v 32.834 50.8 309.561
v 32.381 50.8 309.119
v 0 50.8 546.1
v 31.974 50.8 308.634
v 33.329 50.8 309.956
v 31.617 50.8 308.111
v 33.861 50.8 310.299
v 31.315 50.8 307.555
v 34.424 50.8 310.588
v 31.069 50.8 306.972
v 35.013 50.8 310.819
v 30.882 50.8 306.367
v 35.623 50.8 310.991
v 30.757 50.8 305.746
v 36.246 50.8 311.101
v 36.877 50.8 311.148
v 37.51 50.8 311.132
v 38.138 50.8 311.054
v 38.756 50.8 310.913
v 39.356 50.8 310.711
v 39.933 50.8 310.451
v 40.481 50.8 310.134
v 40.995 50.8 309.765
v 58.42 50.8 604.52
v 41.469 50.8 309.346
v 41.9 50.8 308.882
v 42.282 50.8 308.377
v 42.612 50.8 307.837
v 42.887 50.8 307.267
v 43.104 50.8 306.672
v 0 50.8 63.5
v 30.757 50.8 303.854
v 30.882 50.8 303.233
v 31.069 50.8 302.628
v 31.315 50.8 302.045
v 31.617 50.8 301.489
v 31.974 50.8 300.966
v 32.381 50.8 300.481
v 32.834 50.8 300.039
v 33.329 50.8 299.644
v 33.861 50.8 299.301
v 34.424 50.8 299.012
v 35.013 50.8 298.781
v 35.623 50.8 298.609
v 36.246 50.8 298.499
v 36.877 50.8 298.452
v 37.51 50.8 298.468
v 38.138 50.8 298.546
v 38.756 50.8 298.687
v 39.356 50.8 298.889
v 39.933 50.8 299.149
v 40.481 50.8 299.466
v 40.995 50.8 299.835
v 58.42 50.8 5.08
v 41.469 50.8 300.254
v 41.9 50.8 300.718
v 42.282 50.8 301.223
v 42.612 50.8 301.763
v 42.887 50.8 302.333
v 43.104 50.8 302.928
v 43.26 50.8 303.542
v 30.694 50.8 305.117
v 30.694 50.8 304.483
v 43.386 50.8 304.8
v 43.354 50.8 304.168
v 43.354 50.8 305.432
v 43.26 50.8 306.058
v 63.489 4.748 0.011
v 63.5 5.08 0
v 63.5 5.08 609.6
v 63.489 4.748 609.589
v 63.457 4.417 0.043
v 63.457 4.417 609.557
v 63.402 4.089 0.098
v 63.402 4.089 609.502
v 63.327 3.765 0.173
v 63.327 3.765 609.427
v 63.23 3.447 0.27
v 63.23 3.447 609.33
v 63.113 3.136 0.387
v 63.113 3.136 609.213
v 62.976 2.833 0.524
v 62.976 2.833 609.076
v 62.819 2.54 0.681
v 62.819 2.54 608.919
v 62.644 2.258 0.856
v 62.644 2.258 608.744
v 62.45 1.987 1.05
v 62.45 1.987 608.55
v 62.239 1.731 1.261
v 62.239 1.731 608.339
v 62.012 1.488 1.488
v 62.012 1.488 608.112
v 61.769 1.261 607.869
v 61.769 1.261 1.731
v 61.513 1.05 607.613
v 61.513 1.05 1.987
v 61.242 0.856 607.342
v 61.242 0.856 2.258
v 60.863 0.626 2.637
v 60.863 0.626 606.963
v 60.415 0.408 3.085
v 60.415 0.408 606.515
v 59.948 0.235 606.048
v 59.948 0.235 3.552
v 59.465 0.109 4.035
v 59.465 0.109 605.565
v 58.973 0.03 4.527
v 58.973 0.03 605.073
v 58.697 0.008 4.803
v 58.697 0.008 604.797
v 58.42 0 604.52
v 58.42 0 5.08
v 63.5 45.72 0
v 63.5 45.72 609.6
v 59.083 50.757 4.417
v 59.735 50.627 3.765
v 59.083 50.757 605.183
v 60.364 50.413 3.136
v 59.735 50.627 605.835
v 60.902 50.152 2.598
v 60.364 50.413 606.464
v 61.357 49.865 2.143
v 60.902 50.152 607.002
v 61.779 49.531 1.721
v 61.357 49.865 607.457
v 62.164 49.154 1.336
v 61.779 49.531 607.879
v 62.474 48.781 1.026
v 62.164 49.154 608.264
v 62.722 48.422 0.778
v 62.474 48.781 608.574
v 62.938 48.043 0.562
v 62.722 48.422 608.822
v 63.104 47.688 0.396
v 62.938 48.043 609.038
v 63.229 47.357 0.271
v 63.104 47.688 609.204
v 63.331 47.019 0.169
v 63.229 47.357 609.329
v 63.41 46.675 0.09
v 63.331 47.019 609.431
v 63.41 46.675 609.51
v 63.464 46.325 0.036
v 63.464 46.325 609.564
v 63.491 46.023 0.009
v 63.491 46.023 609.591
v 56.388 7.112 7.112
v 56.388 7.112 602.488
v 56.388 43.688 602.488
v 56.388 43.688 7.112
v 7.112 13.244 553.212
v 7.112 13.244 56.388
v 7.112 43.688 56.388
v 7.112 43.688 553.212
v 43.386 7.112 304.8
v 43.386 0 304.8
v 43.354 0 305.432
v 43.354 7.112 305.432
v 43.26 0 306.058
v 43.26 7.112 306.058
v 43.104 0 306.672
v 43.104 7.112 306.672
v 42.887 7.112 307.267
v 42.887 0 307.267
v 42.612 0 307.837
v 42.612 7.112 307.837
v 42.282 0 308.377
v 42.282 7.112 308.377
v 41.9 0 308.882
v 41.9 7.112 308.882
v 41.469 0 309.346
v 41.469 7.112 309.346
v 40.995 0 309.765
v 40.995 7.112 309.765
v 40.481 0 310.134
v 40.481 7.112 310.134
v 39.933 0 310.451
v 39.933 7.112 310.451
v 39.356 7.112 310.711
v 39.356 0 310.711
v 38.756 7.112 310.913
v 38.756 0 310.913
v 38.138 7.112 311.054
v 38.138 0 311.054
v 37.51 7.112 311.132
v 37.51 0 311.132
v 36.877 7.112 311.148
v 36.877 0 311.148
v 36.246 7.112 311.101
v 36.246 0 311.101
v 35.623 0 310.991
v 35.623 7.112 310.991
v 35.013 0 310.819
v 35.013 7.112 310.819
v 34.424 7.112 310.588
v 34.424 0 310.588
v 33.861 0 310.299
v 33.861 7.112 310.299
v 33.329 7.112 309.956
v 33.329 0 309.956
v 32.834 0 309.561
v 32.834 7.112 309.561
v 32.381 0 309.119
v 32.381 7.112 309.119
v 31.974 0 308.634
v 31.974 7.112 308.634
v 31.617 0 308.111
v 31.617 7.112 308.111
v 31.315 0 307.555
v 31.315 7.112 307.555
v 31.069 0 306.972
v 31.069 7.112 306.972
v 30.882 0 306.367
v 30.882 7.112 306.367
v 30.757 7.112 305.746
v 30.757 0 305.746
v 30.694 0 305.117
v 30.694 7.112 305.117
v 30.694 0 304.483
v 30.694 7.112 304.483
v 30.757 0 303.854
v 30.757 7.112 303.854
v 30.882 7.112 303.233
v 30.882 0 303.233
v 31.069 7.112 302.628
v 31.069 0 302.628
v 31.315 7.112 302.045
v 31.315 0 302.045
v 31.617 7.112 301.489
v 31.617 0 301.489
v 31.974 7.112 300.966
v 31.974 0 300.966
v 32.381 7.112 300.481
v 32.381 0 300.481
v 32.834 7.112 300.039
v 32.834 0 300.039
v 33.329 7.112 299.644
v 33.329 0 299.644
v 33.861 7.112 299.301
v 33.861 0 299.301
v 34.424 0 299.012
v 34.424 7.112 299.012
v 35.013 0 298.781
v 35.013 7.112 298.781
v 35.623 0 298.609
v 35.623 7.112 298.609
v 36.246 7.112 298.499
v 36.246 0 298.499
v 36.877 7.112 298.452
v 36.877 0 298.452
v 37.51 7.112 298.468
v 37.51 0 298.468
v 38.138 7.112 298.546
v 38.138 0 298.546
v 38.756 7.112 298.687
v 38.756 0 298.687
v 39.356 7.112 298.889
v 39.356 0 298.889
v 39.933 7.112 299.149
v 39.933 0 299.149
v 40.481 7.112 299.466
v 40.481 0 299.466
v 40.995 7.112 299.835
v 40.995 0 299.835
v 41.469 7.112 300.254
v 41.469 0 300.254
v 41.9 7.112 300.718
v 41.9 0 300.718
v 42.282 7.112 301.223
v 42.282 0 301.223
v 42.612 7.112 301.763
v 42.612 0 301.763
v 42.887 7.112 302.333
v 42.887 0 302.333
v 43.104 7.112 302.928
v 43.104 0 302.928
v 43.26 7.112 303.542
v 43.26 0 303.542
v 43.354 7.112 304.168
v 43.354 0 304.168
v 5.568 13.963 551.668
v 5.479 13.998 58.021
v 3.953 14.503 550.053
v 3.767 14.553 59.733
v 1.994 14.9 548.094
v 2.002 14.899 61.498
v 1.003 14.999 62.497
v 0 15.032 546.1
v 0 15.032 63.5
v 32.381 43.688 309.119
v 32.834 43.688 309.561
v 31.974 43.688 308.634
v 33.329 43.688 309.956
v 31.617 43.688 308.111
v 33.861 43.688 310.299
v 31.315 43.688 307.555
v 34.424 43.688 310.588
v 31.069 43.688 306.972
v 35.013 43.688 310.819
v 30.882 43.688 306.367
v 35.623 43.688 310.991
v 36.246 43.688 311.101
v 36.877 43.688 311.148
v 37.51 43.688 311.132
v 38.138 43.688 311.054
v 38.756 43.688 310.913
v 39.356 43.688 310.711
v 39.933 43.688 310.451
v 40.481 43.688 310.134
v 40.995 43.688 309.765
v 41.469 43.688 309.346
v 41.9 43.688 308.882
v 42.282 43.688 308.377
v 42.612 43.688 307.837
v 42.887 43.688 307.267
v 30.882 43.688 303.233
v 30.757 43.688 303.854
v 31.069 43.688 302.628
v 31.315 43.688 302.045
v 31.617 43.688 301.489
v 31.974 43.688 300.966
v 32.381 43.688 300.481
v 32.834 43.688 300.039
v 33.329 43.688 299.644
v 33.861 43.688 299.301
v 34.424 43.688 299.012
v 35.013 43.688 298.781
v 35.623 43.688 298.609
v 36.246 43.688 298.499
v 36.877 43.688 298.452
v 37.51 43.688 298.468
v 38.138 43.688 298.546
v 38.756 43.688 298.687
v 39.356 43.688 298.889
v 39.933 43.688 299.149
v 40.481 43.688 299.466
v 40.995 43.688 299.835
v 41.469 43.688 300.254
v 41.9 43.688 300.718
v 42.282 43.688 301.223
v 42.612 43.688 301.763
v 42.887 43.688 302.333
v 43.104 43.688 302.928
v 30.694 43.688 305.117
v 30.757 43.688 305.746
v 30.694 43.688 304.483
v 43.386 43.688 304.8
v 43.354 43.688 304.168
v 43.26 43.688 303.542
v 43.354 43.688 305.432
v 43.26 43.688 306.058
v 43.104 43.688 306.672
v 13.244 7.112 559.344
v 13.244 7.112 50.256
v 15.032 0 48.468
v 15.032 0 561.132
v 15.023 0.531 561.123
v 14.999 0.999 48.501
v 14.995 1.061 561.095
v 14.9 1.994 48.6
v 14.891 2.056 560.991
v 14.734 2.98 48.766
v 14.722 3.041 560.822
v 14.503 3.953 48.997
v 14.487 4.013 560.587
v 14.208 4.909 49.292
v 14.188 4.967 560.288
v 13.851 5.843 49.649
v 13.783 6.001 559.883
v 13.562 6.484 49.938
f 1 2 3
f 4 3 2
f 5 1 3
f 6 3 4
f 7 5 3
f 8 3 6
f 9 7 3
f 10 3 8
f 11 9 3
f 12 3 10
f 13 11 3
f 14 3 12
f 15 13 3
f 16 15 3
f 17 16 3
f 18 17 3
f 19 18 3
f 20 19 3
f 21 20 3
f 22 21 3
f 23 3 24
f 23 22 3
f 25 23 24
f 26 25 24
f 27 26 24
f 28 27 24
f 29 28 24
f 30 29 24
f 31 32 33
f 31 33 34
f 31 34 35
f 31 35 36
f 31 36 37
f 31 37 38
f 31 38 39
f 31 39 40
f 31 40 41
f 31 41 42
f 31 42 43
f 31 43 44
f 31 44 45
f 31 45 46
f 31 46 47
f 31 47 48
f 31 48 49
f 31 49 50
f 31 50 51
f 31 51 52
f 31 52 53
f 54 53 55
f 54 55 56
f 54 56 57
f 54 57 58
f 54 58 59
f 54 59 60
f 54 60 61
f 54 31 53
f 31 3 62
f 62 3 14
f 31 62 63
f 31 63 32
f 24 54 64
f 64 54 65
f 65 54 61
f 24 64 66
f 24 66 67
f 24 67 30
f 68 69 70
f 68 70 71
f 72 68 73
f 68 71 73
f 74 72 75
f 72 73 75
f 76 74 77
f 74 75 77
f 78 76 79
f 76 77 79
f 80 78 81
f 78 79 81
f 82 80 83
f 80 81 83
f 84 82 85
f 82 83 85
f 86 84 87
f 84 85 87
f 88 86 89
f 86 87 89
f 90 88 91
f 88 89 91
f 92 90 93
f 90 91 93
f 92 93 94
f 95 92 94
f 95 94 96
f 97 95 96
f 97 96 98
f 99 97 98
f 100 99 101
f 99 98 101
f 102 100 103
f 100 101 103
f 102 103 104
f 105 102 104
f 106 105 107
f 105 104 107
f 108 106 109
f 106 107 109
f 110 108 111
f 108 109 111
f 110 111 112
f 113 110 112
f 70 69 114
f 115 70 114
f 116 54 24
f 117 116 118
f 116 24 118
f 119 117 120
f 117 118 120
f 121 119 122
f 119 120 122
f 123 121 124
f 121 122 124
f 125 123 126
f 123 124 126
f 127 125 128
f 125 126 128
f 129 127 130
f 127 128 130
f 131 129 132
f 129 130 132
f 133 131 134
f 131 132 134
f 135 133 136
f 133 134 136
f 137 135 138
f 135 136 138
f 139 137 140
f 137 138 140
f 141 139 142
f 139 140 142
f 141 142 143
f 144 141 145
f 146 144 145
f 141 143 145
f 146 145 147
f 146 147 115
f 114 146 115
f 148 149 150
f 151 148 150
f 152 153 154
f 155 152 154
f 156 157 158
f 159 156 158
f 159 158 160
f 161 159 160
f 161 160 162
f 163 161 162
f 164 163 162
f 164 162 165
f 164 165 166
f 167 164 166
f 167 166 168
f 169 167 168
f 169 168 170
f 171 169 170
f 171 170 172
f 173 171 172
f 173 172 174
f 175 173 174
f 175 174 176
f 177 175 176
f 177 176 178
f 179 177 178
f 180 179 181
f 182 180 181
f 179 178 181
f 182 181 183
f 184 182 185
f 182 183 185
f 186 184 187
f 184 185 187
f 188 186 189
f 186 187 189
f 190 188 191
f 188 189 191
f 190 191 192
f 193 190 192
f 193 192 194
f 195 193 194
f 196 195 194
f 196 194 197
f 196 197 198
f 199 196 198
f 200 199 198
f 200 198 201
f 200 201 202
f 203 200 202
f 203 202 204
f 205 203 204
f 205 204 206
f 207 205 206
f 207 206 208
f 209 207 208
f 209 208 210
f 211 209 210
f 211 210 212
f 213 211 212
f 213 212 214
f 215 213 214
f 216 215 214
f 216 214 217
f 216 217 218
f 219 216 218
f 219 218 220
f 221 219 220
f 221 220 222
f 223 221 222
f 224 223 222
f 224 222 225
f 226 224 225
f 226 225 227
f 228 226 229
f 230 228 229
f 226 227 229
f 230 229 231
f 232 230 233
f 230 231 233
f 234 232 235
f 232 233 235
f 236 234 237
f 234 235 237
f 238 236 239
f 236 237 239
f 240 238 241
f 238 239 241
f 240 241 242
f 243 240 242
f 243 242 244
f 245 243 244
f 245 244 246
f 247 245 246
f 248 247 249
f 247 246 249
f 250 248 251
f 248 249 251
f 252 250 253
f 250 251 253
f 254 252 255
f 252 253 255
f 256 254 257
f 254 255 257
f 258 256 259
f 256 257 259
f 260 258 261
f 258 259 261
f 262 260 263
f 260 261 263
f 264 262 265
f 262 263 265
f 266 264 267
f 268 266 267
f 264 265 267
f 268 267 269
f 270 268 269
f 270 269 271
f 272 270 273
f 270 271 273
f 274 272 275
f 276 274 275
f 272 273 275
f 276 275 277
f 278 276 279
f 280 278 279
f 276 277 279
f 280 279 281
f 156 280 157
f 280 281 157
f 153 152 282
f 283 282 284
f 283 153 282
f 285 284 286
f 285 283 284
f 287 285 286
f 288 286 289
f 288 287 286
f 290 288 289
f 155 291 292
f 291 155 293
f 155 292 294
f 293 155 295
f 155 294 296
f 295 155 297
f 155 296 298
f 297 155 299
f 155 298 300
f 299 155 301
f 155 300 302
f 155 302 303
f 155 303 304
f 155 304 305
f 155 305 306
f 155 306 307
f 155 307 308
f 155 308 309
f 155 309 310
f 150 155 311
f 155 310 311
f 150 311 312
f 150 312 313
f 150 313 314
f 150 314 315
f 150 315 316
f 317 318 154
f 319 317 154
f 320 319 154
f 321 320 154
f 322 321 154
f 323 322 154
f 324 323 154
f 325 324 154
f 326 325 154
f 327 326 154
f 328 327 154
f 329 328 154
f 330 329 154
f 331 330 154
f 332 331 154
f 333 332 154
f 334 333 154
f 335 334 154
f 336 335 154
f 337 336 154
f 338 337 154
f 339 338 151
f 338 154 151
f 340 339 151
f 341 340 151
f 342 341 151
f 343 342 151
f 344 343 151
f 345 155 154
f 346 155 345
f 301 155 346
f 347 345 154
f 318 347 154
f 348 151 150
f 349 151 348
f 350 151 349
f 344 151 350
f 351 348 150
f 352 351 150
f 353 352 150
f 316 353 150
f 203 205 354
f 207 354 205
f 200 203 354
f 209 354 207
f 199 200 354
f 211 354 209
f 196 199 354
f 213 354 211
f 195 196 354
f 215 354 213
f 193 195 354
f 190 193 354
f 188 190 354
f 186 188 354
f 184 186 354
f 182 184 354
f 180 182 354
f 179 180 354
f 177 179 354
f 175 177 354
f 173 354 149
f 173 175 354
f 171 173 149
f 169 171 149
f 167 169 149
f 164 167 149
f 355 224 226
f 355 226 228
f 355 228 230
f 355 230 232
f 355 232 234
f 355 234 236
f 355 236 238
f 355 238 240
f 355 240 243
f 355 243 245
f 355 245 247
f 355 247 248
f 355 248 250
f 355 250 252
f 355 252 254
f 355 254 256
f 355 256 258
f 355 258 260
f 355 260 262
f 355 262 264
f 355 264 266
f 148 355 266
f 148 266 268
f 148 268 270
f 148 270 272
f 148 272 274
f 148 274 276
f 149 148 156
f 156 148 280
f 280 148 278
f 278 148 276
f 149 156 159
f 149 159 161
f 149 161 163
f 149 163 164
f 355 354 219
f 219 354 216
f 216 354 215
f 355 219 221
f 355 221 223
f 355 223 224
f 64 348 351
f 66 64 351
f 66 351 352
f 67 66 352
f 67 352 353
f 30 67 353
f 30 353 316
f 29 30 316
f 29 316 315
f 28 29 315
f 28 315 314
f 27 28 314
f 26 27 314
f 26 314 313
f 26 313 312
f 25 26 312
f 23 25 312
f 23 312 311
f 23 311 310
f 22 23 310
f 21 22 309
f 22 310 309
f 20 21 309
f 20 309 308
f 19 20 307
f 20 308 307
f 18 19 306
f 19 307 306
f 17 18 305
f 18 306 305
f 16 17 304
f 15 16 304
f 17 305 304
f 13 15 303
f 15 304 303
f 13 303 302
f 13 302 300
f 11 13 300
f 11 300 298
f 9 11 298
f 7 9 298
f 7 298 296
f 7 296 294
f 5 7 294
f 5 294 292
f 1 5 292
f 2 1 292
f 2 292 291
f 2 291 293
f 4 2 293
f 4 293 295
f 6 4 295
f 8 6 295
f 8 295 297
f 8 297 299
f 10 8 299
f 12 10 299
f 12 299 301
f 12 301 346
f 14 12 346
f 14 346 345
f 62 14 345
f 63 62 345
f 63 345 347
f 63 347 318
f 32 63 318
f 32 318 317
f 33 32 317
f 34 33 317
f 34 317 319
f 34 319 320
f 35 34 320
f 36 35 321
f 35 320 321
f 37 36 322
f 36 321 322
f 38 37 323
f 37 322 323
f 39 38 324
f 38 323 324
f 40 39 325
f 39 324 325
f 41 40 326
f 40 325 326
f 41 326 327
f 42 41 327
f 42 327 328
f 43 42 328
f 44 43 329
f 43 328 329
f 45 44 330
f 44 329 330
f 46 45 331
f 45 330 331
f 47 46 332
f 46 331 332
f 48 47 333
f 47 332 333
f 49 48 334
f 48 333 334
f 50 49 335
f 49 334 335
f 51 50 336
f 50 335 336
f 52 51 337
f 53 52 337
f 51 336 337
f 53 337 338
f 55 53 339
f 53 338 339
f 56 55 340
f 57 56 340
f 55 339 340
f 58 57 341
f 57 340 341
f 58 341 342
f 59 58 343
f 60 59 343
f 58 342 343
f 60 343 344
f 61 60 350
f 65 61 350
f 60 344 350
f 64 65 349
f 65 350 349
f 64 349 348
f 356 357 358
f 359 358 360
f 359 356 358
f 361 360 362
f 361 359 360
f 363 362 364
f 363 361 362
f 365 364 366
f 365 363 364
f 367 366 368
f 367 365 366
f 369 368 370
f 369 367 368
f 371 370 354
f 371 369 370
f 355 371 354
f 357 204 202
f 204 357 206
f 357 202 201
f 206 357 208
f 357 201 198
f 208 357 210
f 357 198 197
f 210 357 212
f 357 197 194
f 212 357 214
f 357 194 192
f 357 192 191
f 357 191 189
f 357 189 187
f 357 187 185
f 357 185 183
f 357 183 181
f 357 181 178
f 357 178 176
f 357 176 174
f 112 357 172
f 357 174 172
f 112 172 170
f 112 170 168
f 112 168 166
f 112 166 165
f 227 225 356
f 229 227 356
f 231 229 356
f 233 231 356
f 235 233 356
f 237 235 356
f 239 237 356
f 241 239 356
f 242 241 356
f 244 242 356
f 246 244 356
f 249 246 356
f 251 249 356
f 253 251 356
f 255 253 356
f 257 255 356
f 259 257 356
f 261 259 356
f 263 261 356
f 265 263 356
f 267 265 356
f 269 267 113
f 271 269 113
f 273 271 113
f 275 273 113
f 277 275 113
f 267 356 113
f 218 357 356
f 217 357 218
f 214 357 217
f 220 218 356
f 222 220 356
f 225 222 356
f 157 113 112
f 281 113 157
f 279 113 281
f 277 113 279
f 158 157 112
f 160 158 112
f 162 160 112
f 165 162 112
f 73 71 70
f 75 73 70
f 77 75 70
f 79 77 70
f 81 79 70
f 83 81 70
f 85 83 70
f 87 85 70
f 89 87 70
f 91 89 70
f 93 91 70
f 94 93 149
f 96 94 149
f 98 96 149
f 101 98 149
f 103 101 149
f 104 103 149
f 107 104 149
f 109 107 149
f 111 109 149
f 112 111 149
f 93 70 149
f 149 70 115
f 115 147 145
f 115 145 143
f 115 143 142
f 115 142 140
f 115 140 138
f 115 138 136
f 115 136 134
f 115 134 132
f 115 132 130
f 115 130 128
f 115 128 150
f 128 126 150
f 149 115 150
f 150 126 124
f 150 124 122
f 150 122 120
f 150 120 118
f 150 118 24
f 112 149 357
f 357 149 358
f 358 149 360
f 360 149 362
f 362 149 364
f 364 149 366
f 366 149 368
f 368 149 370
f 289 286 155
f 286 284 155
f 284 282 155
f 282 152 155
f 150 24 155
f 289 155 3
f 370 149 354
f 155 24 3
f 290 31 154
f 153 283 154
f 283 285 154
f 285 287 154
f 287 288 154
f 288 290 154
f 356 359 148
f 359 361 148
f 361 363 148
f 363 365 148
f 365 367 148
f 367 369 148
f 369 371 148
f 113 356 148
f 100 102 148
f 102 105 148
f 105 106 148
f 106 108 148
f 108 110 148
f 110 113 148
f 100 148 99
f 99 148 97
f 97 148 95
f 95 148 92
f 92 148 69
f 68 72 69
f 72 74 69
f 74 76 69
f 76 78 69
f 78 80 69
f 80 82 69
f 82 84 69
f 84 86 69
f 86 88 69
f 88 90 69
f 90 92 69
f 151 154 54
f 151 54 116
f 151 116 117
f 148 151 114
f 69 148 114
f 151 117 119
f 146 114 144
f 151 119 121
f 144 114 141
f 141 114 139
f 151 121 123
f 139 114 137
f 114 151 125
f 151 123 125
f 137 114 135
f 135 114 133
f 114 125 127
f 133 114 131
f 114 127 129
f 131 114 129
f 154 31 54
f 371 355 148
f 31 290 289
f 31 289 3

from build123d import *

# Parameters (mm, degrees)
F0_W      = 63.5
F0_H      = 50.8
F1_DEPTH  = 609.6
F3_DEPTH  = 76.2
F5_R      = 15.0324721588
F6_DEPTH  = 609.6
F7_R      = 5.08
F8_R      = 6.35
F9_DEPTH  = 76.2
F4_W      = 49.2759997249
F4_H      = 36.5759997249
F10_DEPTH = 609.6


with BuildPart() as f1:
    # F0 (on Top) → F1 (new body)
    with BuildSketch(Plane.XY):
        with Locations((31.75, 25.4)):
            Rectangle(F0_W, F0_H)
    extrude(amount=F1_DEPTH)

    # F2 (on face) → F3 (cut)
    with BuildSketch(Plane(origin=(0, 50.8, 0), x_dir=(-1, 0, 0), z_dir=(0, 1, 0))):
        Polygon((13.9825628959, 77.4825628959), (0, 63.5), (0, 0), (40.1009321213, 0), align=None)
        Polygon((0, 63.5), (-63.5, 0), (0, 0), align=None)
        Polygon((0, 609.6), (-63.5, 609.6), (0, 546.1), align=None)
    extrude(amount=-F3_DEPTH, mode=Mode.SUBTRACT)

    # F5 (on Top) → F6 (cut)
    with BuildSketch(Plane.XY):
        Circle(F5_R)
    extrude(amount=F6_DEPTH, mode=Mode.SUBTRACT)

    # F7
    f7_edges = [f1.edges().sort_by_distance(p)[0] for p in [
        (63.5, 50.8, 304.8),
        (63.5, 0, 304.8),
    ]]
    fillet(f7_edges, radius=F7_R)

    # F8 (on face) → F9 (cut)
    with BuildSketch(Plane.XZ):
        with Locations((37.0356701314, 304.8)):
            Circle(F8_R)
    extrude(amount=-F9_DEPTH, mode=Mode.SUBTRACT)

    # F4 (on Top) → F10 (cut)
    with BuildSketch(Plane.XY):
        with Locations((31.75, 25.4)):
            Rectangle(F4_W, F4_H)
    extrude(amount=F10_DEPTH, mode=Mode.SUBTRACT)


solid = f1.part
